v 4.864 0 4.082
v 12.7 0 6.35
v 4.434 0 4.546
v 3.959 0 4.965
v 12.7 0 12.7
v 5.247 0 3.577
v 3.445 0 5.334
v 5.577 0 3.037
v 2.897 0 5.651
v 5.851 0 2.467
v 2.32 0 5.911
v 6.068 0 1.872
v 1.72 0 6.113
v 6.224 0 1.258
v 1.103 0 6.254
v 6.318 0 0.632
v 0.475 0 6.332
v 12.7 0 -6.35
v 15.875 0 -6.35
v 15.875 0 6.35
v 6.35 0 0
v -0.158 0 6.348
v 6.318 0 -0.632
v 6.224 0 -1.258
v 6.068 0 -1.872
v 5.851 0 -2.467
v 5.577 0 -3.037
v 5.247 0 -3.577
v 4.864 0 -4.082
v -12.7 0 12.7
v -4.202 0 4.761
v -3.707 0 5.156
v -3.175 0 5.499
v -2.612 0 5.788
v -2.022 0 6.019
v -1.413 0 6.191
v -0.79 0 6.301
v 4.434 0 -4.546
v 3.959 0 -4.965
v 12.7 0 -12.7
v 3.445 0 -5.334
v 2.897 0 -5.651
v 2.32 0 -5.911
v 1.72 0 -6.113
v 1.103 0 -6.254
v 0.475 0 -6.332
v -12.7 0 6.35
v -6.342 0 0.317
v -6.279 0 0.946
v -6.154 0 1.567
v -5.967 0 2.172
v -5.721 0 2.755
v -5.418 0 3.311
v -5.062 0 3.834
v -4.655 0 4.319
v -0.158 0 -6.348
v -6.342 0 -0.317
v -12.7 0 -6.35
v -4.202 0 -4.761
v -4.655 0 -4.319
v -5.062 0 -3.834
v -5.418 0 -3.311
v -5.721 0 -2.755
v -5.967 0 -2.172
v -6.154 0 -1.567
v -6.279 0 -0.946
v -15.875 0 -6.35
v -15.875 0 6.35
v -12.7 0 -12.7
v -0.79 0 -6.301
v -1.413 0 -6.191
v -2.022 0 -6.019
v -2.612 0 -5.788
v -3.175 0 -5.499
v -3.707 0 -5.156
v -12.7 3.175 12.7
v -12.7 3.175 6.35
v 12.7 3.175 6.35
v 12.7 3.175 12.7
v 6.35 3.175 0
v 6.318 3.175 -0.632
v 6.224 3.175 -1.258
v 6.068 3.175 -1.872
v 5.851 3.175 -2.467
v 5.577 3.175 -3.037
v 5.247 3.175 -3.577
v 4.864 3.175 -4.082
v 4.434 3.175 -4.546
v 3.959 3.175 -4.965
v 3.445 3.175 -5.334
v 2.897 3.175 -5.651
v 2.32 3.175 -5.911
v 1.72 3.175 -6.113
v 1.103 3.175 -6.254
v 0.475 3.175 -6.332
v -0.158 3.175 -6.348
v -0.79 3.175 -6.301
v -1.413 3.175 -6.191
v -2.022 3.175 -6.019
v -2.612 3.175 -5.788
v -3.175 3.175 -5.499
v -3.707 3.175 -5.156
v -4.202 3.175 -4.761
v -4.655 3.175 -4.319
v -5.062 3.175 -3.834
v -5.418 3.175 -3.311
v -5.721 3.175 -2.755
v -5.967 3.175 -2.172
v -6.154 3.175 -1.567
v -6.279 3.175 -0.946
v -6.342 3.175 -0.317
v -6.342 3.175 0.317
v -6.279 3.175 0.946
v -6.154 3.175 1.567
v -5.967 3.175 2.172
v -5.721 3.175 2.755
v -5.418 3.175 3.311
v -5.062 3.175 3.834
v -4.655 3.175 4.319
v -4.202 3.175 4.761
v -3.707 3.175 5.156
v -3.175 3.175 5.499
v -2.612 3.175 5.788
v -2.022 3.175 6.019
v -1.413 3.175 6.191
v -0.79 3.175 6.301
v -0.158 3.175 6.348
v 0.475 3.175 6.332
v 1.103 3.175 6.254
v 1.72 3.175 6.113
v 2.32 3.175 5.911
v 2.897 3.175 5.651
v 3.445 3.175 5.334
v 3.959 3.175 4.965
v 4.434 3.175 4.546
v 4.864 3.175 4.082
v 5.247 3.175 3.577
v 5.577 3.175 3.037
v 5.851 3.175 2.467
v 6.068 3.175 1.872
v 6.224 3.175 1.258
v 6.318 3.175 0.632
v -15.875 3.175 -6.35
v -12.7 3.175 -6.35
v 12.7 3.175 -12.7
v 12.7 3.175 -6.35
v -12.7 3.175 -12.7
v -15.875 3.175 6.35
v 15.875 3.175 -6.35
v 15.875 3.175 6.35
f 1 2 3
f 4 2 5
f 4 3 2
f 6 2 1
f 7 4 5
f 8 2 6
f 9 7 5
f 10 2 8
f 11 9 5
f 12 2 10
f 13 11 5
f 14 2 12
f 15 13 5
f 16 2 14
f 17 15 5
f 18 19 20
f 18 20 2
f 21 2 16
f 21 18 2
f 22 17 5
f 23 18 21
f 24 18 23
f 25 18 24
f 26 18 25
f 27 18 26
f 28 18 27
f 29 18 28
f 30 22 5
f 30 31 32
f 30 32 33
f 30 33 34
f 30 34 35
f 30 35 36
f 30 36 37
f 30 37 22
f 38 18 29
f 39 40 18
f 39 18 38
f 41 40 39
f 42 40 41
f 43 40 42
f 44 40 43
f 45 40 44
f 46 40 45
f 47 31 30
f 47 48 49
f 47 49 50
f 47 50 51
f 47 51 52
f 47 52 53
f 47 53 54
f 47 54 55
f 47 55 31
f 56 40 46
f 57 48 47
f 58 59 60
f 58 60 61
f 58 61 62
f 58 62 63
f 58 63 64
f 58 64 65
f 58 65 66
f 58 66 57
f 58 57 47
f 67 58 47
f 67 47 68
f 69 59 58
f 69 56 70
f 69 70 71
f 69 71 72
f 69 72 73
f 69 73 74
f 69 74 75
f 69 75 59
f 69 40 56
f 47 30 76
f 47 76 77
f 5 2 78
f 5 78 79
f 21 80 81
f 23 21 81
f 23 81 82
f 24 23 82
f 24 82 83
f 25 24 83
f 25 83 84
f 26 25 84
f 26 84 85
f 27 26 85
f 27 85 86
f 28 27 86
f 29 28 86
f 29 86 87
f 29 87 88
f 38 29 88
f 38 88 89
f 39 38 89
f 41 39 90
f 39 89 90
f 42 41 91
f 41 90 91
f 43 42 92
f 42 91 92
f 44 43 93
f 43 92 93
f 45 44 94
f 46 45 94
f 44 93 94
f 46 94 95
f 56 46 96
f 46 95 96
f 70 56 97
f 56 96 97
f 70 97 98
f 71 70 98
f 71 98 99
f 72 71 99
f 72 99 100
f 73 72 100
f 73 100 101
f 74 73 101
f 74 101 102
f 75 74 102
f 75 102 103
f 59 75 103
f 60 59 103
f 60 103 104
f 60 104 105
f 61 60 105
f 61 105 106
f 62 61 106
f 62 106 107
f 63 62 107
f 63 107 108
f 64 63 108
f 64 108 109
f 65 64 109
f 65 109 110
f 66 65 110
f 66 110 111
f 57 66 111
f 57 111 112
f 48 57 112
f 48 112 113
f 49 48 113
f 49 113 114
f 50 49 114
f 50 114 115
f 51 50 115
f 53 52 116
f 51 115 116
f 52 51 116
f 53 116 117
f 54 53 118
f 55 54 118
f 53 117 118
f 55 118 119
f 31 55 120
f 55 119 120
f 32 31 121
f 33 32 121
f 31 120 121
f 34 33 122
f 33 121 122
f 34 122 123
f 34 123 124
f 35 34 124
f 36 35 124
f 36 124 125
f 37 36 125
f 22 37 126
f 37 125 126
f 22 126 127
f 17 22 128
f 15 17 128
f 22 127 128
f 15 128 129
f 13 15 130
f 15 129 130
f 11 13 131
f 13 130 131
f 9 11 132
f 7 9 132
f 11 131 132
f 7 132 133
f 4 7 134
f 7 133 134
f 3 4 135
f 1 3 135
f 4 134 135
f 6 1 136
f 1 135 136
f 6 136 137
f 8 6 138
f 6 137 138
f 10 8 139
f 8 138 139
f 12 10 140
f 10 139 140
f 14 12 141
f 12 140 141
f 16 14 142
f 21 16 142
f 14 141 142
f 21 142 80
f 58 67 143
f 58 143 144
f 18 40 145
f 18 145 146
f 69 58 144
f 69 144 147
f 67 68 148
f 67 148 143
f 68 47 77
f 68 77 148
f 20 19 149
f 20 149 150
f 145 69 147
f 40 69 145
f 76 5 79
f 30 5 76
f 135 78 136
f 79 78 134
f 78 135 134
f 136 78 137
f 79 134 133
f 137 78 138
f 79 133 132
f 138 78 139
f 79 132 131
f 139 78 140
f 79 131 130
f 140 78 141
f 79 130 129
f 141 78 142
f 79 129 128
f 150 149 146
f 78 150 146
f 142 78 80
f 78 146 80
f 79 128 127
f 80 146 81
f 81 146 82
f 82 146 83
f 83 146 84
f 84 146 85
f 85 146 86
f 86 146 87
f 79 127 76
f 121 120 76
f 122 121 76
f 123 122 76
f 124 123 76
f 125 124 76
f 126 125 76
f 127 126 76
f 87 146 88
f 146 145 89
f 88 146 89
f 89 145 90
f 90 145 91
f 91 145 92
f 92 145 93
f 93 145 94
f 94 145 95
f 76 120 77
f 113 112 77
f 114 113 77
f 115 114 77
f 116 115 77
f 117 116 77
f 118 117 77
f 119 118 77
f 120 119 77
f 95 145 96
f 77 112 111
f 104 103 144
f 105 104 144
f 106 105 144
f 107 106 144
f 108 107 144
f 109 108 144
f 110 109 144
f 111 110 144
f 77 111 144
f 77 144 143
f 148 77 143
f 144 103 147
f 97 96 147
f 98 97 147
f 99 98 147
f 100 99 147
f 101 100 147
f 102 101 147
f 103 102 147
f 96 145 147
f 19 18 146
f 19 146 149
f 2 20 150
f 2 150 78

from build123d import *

# Parameters (mm, degrees)
BOSS_EXTRUDE1_DEPTH = 3.175
SKETCH2_R           = 6.35
CUT_EXTRUDE1_DEPTH  = 4.175


with BuildPart() as part:
    # Sketch1 → Boss-Extrude1 (new body)
    with BuildSketch(Plane(origin=(0, 0, 0), x_dir=(1, 0, 0), z_dir=(0, 1, 0))):
        Polygon((-12.7, 6.35), (-12.7, 12.7), (12.7, 12.7), (12.7, 6.35), (15.875, 6.35), (15.875, -6.35), (12.7, -6.35), (12.7, -12.7), (-12.7, -12.7), (-12.7, -6.35), (-15.875, -6.35), (-15.875, 6.35), align=None)
    extrude(amount=BOSS_EXTRUDE1_DEPTH)

    # Sketch2 → Cut-Extrude1 (cut, through all)
    with BuildSketch(Plane(origin=(0, 3.175, 0), x_dir=(1, 0, 0), z_dir=(0, 1, 0))):
        Circle(SKETCH2_R)
    extrude(amount=-CUT_EXTRUDE1_DEPTH, mode=Mode.SUBTRACT)


solid = part.part
